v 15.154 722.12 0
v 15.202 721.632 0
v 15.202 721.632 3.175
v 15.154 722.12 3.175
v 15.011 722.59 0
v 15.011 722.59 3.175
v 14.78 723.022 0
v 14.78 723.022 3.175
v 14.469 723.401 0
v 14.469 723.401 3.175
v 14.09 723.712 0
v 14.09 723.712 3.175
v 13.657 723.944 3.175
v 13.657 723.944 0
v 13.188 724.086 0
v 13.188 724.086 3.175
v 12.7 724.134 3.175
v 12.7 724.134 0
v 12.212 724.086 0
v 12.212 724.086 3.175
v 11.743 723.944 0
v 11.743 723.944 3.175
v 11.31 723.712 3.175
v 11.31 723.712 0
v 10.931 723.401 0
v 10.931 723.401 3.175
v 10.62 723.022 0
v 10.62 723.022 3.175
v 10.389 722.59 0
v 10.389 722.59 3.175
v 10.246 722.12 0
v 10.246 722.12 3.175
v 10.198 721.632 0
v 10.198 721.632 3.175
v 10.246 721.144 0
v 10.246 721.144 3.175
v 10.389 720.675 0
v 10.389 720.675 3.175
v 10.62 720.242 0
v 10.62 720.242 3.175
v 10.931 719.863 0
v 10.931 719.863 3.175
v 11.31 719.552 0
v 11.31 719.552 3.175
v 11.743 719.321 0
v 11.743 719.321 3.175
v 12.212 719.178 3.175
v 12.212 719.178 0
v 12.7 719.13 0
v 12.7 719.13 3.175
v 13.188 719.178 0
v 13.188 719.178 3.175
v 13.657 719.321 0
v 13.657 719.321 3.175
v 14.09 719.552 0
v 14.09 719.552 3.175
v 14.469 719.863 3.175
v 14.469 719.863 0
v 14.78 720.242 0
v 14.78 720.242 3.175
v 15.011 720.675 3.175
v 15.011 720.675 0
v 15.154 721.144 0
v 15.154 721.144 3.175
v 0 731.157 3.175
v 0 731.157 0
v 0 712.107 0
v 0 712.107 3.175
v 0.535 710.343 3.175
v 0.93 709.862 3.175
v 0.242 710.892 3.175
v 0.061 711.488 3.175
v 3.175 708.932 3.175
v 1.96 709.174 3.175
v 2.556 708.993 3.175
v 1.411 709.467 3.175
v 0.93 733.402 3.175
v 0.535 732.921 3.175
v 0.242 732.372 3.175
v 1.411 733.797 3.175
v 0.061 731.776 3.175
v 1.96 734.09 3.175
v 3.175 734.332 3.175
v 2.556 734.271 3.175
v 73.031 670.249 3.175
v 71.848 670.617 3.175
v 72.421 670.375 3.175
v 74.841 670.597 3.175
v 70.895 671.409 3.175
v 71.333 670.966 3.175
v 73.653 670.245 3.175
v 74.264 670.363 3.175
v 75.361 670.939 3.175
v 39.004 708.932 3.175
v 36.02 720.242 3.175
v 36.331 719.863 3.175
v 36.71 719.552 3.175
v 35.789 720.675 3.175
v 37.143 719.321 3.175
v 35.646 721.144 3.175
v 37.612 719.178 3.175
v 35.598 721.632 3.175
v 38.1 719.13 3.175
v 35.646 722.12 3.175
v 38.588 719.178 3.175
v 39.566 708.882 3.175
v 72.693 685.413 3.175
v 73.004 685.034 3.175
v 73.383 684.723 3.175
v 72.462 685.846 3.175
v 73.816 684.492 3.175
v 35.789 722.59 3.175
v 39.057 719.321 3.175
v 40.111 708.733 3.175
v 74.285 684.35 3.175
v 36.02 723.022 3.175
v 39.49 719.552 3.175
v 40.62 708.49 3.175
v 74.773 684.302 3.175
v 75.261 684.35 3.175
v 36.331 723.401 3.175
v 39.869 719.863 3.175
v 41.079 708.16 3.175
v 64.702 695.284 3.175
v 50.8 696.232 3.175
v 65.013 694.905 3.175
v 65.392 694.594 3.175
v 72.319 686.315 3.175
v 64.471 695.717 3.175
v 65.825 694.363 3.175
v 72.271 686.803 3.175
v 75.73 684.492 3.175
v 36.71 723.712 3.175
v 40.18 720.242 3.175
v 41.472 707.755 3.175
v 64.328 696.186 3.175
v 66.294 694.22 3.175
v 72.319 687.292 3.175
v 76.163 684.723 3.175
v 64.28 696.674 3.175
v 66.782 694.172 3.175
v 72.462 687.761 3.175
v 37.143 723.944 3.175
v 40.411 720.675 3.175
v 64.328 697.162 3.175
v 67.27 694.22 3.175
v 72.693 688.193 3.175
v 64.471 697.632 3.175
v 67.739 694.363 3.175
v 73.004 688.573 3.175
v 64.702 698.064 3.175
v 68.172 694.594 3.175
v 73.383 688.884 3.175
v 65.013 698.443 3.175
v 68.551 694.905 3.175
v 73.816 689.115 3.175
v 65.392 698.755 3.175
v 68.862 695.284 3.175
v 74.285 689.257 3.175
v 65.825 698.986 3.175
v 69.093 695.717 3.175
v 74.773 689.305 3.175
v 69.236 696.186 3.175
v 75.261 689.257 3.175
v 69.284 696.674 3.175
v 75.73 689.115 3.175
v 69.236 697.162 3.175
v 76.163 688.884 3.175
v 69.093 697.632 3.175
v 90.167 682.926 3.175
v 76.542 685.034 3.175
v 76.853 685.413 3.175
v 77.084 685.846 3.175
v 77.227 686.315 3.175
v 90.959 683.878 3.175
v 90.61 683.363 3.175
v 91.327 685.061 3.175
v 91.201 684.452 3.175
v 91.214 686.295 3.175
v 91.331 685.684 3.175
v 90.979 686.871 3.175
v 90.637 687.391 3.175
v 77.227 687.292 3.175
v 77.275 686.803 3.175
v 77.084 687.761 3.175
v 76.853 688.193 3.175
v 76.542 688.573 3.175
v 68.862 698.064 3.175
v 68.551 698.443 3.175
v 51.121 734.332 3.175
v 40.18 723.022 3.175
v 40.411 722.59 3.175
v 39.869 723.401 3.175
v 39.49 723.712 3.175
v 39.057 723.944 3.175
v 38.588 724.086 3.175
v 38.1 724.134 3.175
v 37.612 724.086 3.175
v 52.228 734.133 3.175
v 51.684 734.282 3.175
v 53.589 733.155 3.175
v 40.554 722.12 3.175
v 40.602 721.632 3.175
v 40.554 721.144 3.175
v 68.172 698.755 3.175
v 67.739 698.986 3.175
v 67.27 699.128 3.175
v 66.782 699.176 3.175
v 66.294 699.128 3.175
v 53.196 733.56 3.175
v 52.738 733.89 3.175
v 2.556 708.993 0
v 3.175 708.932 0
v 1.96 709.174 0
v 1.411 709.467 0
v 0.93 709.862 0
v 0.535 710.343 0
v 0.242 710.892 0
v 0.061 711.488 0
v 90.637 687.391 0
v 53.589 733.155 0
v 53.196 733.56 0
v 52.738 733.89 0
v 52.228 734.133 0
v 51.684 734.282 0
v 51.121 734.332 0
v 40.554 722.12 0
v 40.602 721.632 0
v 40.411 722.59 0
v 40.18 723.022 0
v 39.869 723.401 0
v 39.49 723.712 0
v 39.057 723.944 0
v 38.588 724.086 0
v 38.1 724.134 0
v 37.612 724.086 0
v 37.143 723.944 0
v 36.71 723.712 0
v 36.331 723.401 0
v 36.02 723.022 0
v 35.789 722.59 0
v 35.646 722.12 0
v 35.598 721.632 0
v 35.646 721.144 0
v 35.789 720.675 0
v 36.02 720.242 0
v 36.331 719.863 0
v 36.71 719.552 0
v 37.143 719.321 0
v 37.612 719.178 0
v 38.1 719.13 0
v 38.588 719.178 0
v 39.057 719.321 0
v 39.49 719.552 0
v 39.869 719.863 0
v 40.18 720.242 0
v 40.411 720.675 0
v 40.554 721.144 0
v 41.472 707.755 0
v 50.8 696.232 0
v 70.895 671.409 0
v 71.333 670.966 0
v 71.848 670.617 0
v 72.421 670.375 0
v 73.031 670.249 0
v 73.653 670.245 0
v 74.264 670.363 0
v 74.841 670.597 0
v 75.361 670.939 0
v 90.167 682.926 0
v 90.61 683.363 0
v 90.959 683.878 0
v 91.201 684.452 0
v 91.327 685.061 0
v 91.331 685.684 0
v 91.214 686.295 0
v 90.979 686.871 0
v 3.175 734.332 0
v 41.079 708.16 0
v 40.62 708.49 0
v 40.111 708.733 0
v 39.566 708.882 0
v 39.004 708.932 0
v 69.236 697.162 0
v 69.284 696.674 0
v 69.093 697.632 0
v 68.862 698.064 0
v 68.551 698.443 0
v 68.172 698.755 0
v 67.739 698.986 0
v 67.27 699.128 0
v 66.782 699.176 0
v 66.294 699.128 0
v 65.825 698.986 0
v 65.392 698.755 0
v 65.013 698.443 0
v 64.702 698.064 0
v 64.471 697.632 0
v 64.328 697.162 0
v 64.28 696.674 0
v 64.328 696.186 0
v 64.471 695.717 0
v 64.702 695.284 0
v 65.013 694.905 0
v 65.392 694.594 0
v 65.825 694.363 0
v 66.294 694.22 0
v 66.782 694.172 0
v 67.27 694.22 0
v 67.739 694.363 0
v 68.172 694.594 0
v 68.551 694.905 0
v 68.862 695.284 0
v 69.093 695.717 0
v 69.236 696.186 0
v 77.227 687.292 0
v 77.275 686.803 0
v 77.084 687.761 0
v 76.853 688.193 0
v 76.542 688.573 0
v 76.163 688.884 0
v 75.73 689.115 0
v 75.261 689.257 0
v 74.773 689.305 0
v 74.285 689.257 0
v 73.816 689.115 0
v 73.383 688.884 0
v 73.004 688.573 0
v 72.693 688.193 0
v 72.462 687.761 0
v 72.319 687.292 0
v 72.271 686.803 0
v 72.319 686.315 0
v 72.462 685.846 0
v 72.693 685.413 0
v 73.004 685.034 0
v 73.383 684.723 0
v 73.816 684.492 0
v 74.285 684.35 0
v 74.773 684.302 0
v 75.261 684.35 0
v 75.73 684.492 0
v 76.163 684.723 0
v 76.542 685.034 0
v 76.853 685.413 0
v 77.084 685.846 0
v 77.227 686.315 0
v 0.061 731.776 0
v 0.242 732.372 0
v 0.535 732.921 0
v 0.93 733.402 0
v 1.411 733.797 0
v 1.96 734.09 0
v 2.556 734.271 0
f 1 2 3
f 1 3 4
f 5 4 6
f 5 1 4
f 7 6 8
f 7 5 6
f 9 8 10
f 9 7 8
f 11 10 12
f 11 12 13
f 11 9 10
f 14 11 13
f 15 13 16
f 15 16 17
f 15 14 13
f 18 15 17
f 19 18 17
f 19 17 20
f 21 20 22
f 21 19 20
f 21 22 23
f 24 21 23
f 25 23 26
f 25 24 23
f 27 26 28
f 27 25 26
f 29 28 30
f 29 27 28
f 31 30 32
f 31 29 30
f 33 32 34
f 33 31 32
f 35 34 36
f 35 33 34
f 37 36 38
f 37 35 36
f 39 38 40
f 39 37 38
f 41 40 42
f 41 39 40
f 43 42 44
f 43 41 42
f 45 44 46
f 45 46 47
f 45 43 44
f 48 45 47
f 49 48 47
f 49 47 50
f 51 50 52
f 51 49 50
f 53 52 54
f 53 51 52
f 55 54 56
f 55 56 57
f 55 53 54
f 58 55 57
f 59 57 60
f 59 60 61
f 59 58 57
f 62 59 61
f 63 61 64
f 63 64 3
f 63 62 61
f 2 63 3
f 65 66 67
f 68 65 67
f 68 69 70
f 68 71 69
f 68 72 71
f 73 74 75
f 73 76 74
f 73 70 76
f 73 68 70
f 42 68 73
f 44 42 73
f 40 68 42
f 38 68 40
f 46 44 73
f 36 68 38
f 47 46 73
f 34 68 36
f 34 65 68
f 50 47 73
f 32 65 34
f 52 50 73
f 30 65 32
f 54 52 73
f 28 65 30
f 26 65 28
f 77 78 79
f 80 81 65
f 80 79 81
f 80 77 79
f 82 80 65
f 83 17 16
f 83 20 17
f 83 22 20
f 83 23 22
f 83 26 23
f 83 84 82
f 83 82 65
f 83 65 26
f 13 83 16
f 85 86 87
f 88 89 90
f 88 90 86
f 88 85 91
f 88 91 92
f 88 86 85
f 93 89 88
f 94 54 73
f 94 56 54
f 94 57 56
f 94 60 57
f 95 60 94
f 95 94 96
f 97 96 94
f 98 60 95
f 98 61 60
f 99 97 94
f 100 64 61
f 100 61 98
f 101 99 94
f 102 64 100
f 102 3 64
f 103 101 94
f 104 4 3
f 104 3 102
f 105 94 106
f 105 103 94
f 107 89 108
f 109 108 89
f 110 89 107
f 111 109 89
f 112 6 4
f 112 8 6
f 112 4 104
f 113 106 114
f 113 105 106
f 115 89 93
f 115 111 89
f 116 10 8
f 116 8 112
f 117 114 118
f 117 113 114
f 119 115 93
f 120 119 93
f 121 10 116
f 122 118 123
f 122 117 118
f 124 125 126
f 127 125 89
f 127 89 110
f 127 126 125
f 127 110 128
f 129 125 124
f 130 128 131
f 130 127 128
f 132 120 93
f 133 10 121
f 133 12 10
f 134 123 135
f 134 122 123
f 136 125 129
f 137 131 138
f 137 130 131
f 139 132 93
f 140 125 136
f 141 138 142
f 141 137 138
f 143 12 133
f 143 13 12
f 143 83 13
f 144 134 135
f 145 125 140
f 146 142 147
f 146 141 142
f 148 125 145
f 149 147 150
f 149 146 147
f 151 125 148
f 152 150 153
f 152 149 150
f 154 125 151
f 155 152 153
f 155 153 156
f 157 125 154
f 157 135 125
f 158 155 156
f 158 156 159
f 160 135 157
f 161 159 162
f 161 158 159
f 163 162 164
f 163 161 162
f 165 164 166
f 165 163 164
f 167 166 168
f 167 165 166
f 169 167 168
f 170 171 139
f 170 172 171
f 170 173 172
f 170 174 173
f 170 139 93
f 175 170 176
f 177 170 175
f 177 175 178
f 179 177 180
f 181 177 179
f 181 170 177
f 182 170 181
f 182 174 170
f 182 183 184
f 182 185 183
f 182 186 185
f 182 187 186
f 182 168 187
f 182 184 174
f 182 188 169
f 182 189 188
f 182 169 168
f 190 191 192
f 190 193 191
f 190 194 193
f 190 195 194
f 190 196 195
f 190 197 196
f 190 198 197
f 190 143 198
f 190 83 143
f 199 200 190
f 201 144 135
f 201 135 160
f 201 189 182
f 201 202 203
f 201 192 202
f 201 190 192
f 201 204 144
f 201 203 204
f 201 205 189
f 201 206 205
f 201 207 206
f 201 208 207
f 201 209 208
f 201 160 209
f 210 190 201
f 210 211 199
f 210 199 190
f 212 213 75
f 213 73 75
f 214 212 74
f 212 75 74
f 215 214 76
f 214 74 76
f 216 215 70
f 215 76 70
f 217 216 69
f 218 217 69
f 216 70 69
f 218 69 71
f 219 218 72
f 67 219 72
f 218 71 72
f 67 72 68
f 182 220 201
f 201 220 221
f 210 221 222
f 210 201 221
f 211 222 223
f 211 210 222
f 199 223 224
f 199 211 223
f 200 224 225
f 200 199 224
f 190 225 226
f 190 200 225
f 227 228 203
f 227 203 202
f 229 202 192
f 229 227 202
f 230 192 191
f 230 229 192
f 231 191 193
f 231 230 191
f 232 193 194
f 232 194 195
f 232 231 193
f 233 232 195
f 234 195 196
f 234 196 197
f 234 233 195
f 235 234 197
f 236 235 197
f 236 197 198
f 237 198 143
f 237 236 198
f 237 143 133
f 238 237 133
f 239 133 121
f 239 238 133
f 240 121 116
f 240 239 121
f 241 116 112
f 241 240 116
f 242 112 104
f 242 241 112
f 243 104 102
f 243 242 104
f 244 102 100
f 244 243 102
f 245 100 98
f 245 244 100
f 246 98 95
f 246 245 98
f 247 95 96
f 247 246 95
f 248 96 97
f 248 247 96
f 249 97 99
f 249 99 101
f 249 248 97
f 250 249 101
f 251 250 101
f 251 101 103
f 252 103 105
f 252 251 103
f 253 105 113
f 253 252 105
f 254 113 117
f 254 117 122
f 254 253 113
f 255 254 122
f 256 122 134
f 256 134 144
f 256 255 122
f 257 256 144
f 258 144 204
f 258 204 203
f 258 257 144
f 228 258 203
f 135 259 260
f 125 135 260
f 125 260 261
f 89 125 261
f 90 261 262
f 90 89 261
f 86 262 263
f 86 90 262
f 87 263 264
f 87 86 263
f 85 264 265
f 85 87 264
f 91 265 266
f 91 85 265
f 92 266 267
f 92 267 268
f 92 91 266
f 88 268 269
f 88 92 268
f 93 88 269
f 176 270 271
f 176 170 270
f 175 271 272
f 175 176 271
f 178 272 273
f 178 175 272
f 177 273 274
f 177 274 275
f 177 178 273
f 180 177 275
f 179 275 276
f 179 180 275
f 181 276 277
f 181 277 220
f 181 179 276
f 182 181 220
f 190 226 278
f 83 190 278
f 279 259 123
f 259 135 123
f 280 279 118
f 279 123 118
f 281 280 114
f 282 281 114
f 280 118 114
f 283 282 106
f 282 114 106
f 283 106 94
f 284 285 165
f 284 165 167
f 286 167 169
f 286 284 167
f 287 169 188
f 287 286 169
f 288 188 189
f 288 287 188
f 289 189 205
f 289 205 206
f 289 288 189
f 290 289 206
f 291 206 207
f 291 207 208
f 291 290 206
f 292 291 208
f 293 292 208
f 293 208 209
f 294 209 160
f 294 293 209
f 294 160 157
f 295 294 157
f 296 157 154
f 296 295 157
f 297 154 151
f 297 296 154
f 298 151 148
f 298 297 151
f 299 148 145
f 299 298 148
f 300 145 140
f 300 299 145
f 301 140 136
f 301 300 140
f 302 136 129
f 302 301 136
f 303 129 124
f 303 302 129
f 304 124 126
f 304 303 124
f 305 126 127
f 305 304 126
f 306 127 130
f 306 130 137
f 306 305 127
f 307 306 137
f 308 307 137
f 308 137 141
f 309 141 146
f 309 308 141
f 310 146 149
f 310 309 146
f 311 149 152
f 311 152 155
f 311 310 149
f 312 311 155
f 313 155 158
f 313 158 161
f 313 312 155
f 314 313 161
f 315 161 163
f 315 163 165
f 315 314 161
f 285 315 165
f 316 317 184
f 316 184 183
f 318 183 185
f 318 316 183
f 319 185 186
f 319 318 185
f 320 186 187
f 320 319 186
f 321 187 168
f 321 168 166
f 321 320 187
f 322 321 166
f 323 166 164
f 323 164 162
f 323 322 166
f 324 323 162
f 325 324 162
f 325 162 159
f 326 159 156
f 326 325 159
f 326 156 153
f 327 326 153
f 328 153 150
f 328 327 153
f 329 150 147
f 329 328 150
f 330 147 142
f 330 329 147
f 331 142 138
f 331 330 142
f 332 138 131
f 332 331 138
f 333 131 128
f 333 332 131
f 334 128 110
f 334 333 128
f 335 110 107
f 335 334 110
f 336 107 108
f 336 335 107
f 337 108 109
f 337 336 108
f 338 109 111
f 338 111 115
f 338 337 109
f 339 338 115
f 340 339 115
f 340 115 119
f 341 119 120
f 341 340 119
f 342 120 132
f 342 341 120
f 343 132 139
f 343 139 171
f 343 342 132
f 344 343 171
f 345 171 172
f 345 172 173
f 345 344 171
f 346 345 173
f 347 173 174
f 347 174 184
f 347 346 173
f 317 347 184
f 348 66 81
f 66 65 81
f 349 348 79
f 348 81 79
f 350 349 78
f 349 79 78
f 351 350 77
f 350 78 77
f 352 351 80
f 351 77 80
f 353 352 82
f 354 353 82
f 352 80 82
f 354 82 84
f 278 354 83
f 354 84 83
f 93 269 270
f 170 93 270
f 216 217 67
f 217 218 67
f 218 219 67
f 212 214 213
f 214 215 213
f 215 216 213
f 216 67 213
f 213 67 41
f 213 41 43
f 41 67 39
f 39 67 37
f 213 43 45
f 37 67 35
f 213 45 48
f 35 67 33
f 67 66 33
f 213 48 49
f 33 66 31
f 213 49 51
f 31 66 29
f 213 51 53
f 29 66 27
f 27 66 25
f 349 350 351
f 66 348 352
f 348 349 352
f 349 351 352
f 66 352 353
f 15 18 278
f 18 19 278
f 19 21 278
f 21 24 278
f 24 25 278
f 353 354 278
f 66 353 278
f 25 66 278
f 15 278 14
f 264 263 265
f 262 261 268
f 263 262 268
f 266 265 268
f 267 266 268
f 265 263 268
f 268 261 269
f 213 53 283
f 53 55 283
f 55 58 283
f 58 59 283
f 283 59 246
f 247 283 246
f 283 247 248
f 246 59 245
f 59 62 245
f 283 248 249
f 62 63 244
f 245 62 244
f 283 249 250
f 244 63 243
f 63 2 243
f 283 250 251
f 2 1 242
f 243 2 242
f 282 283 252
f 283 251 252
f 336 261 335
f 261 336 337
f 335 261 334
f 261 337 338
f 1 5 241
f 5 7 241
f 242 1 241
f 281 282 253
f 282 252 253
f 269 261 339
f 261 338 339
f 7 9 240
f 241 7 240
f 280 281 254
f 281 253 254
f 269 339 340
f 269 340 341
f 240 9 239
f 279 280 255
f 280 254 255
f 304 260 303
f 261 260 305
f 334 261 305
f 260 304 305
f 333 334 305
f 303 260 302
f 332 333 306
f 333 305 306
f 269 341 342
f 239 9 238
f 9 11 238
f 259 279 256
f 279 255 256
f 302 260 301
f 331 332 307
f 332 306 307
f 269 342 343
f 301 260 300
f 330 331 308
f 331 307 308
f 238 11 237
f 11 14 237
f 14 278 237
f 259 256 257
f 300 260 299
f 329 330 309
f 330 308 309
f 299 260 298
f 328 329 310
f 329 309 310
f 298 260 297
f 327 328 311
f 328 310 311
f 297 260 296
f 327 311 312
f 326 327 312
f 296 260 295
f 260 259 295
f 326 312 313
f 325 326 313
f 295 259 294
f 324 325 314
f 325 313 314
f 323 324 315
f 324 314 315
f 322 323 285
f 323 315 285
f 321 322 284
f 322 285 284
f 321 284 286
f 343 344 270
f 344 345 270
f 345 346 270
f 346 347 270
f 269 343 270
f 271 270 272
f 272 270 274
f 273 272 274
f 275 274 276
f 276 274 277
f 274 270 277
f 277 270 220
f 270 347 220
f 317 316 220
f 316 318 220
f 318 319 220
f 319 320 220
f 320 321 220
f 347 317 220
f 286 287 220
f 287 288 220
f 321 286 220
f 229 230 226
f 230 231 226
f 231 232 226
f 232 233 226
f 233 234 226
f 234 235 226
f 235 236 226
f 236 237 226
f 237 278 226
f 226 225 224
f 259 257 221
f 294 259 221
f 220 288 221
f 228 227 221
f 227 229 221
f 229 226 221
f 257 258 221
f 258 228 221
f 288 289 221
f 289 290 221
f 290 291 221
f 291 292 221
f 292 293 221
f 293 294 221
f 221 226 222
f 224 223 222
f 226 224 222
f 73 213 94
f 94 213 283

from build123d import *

# Parameters (mm, degrees)
SKETCH1_R           = 2.5019
BOSS_EXTRUDE1_DEPTH = 3.175
FILLET1_R           = 3.175


with BuildPart() as part:
    # Sketch1 → Boss-Extrude1 (new body)
    with BuildSketch(Plane.XY):
        Polygon((50.8, 696.232068306), (72.893120941, 668.941577789), (92.634850884, 684.923570745), (52.636012774, 734.332068306), (0, 734.332068306), (0, 708.932068306), (40.518666443, 708.932068306), align=None)
        with Locations((66.781992956, 696.67430421)):
            Circle(SKETCH1_R, mode=Mode.SUBTRACT)
        with Locations((74.772989434, 686.803439238)):
            Circle(SKETCH1_R, mode=Mode.SUBTRACT)
        with Locations((12.7, 721.632068306)):
            Circle(SKETCH1_R, mode=Mode.SUBTRACT)
        with Locations((38.1, 721.632068306)):
            Circle(SKETCH1_R, mode=Mode.SUBTRACT)
    extrude(amount=BOSS_EXTRUDE1_DEPTH)

    # Fillet1
    fillet1_edges = [part.edges().sort_by_distance(p)[0] for p in [
        (52.636012774, 734.332068306, 1.5875),
        (92.634850884, 684.923570745, 1.5875),
        (72.893120941, 668.941577789, 1.5875),
        (40.518666443, 708.932068306, 1.5875),
        (0, 708.932068306, 1.5875),
        (0, 734.332068306, 1.5875),
    ]]
    fillet(fillet1_edges, radius=FILLET1_R)


solid = part.part
